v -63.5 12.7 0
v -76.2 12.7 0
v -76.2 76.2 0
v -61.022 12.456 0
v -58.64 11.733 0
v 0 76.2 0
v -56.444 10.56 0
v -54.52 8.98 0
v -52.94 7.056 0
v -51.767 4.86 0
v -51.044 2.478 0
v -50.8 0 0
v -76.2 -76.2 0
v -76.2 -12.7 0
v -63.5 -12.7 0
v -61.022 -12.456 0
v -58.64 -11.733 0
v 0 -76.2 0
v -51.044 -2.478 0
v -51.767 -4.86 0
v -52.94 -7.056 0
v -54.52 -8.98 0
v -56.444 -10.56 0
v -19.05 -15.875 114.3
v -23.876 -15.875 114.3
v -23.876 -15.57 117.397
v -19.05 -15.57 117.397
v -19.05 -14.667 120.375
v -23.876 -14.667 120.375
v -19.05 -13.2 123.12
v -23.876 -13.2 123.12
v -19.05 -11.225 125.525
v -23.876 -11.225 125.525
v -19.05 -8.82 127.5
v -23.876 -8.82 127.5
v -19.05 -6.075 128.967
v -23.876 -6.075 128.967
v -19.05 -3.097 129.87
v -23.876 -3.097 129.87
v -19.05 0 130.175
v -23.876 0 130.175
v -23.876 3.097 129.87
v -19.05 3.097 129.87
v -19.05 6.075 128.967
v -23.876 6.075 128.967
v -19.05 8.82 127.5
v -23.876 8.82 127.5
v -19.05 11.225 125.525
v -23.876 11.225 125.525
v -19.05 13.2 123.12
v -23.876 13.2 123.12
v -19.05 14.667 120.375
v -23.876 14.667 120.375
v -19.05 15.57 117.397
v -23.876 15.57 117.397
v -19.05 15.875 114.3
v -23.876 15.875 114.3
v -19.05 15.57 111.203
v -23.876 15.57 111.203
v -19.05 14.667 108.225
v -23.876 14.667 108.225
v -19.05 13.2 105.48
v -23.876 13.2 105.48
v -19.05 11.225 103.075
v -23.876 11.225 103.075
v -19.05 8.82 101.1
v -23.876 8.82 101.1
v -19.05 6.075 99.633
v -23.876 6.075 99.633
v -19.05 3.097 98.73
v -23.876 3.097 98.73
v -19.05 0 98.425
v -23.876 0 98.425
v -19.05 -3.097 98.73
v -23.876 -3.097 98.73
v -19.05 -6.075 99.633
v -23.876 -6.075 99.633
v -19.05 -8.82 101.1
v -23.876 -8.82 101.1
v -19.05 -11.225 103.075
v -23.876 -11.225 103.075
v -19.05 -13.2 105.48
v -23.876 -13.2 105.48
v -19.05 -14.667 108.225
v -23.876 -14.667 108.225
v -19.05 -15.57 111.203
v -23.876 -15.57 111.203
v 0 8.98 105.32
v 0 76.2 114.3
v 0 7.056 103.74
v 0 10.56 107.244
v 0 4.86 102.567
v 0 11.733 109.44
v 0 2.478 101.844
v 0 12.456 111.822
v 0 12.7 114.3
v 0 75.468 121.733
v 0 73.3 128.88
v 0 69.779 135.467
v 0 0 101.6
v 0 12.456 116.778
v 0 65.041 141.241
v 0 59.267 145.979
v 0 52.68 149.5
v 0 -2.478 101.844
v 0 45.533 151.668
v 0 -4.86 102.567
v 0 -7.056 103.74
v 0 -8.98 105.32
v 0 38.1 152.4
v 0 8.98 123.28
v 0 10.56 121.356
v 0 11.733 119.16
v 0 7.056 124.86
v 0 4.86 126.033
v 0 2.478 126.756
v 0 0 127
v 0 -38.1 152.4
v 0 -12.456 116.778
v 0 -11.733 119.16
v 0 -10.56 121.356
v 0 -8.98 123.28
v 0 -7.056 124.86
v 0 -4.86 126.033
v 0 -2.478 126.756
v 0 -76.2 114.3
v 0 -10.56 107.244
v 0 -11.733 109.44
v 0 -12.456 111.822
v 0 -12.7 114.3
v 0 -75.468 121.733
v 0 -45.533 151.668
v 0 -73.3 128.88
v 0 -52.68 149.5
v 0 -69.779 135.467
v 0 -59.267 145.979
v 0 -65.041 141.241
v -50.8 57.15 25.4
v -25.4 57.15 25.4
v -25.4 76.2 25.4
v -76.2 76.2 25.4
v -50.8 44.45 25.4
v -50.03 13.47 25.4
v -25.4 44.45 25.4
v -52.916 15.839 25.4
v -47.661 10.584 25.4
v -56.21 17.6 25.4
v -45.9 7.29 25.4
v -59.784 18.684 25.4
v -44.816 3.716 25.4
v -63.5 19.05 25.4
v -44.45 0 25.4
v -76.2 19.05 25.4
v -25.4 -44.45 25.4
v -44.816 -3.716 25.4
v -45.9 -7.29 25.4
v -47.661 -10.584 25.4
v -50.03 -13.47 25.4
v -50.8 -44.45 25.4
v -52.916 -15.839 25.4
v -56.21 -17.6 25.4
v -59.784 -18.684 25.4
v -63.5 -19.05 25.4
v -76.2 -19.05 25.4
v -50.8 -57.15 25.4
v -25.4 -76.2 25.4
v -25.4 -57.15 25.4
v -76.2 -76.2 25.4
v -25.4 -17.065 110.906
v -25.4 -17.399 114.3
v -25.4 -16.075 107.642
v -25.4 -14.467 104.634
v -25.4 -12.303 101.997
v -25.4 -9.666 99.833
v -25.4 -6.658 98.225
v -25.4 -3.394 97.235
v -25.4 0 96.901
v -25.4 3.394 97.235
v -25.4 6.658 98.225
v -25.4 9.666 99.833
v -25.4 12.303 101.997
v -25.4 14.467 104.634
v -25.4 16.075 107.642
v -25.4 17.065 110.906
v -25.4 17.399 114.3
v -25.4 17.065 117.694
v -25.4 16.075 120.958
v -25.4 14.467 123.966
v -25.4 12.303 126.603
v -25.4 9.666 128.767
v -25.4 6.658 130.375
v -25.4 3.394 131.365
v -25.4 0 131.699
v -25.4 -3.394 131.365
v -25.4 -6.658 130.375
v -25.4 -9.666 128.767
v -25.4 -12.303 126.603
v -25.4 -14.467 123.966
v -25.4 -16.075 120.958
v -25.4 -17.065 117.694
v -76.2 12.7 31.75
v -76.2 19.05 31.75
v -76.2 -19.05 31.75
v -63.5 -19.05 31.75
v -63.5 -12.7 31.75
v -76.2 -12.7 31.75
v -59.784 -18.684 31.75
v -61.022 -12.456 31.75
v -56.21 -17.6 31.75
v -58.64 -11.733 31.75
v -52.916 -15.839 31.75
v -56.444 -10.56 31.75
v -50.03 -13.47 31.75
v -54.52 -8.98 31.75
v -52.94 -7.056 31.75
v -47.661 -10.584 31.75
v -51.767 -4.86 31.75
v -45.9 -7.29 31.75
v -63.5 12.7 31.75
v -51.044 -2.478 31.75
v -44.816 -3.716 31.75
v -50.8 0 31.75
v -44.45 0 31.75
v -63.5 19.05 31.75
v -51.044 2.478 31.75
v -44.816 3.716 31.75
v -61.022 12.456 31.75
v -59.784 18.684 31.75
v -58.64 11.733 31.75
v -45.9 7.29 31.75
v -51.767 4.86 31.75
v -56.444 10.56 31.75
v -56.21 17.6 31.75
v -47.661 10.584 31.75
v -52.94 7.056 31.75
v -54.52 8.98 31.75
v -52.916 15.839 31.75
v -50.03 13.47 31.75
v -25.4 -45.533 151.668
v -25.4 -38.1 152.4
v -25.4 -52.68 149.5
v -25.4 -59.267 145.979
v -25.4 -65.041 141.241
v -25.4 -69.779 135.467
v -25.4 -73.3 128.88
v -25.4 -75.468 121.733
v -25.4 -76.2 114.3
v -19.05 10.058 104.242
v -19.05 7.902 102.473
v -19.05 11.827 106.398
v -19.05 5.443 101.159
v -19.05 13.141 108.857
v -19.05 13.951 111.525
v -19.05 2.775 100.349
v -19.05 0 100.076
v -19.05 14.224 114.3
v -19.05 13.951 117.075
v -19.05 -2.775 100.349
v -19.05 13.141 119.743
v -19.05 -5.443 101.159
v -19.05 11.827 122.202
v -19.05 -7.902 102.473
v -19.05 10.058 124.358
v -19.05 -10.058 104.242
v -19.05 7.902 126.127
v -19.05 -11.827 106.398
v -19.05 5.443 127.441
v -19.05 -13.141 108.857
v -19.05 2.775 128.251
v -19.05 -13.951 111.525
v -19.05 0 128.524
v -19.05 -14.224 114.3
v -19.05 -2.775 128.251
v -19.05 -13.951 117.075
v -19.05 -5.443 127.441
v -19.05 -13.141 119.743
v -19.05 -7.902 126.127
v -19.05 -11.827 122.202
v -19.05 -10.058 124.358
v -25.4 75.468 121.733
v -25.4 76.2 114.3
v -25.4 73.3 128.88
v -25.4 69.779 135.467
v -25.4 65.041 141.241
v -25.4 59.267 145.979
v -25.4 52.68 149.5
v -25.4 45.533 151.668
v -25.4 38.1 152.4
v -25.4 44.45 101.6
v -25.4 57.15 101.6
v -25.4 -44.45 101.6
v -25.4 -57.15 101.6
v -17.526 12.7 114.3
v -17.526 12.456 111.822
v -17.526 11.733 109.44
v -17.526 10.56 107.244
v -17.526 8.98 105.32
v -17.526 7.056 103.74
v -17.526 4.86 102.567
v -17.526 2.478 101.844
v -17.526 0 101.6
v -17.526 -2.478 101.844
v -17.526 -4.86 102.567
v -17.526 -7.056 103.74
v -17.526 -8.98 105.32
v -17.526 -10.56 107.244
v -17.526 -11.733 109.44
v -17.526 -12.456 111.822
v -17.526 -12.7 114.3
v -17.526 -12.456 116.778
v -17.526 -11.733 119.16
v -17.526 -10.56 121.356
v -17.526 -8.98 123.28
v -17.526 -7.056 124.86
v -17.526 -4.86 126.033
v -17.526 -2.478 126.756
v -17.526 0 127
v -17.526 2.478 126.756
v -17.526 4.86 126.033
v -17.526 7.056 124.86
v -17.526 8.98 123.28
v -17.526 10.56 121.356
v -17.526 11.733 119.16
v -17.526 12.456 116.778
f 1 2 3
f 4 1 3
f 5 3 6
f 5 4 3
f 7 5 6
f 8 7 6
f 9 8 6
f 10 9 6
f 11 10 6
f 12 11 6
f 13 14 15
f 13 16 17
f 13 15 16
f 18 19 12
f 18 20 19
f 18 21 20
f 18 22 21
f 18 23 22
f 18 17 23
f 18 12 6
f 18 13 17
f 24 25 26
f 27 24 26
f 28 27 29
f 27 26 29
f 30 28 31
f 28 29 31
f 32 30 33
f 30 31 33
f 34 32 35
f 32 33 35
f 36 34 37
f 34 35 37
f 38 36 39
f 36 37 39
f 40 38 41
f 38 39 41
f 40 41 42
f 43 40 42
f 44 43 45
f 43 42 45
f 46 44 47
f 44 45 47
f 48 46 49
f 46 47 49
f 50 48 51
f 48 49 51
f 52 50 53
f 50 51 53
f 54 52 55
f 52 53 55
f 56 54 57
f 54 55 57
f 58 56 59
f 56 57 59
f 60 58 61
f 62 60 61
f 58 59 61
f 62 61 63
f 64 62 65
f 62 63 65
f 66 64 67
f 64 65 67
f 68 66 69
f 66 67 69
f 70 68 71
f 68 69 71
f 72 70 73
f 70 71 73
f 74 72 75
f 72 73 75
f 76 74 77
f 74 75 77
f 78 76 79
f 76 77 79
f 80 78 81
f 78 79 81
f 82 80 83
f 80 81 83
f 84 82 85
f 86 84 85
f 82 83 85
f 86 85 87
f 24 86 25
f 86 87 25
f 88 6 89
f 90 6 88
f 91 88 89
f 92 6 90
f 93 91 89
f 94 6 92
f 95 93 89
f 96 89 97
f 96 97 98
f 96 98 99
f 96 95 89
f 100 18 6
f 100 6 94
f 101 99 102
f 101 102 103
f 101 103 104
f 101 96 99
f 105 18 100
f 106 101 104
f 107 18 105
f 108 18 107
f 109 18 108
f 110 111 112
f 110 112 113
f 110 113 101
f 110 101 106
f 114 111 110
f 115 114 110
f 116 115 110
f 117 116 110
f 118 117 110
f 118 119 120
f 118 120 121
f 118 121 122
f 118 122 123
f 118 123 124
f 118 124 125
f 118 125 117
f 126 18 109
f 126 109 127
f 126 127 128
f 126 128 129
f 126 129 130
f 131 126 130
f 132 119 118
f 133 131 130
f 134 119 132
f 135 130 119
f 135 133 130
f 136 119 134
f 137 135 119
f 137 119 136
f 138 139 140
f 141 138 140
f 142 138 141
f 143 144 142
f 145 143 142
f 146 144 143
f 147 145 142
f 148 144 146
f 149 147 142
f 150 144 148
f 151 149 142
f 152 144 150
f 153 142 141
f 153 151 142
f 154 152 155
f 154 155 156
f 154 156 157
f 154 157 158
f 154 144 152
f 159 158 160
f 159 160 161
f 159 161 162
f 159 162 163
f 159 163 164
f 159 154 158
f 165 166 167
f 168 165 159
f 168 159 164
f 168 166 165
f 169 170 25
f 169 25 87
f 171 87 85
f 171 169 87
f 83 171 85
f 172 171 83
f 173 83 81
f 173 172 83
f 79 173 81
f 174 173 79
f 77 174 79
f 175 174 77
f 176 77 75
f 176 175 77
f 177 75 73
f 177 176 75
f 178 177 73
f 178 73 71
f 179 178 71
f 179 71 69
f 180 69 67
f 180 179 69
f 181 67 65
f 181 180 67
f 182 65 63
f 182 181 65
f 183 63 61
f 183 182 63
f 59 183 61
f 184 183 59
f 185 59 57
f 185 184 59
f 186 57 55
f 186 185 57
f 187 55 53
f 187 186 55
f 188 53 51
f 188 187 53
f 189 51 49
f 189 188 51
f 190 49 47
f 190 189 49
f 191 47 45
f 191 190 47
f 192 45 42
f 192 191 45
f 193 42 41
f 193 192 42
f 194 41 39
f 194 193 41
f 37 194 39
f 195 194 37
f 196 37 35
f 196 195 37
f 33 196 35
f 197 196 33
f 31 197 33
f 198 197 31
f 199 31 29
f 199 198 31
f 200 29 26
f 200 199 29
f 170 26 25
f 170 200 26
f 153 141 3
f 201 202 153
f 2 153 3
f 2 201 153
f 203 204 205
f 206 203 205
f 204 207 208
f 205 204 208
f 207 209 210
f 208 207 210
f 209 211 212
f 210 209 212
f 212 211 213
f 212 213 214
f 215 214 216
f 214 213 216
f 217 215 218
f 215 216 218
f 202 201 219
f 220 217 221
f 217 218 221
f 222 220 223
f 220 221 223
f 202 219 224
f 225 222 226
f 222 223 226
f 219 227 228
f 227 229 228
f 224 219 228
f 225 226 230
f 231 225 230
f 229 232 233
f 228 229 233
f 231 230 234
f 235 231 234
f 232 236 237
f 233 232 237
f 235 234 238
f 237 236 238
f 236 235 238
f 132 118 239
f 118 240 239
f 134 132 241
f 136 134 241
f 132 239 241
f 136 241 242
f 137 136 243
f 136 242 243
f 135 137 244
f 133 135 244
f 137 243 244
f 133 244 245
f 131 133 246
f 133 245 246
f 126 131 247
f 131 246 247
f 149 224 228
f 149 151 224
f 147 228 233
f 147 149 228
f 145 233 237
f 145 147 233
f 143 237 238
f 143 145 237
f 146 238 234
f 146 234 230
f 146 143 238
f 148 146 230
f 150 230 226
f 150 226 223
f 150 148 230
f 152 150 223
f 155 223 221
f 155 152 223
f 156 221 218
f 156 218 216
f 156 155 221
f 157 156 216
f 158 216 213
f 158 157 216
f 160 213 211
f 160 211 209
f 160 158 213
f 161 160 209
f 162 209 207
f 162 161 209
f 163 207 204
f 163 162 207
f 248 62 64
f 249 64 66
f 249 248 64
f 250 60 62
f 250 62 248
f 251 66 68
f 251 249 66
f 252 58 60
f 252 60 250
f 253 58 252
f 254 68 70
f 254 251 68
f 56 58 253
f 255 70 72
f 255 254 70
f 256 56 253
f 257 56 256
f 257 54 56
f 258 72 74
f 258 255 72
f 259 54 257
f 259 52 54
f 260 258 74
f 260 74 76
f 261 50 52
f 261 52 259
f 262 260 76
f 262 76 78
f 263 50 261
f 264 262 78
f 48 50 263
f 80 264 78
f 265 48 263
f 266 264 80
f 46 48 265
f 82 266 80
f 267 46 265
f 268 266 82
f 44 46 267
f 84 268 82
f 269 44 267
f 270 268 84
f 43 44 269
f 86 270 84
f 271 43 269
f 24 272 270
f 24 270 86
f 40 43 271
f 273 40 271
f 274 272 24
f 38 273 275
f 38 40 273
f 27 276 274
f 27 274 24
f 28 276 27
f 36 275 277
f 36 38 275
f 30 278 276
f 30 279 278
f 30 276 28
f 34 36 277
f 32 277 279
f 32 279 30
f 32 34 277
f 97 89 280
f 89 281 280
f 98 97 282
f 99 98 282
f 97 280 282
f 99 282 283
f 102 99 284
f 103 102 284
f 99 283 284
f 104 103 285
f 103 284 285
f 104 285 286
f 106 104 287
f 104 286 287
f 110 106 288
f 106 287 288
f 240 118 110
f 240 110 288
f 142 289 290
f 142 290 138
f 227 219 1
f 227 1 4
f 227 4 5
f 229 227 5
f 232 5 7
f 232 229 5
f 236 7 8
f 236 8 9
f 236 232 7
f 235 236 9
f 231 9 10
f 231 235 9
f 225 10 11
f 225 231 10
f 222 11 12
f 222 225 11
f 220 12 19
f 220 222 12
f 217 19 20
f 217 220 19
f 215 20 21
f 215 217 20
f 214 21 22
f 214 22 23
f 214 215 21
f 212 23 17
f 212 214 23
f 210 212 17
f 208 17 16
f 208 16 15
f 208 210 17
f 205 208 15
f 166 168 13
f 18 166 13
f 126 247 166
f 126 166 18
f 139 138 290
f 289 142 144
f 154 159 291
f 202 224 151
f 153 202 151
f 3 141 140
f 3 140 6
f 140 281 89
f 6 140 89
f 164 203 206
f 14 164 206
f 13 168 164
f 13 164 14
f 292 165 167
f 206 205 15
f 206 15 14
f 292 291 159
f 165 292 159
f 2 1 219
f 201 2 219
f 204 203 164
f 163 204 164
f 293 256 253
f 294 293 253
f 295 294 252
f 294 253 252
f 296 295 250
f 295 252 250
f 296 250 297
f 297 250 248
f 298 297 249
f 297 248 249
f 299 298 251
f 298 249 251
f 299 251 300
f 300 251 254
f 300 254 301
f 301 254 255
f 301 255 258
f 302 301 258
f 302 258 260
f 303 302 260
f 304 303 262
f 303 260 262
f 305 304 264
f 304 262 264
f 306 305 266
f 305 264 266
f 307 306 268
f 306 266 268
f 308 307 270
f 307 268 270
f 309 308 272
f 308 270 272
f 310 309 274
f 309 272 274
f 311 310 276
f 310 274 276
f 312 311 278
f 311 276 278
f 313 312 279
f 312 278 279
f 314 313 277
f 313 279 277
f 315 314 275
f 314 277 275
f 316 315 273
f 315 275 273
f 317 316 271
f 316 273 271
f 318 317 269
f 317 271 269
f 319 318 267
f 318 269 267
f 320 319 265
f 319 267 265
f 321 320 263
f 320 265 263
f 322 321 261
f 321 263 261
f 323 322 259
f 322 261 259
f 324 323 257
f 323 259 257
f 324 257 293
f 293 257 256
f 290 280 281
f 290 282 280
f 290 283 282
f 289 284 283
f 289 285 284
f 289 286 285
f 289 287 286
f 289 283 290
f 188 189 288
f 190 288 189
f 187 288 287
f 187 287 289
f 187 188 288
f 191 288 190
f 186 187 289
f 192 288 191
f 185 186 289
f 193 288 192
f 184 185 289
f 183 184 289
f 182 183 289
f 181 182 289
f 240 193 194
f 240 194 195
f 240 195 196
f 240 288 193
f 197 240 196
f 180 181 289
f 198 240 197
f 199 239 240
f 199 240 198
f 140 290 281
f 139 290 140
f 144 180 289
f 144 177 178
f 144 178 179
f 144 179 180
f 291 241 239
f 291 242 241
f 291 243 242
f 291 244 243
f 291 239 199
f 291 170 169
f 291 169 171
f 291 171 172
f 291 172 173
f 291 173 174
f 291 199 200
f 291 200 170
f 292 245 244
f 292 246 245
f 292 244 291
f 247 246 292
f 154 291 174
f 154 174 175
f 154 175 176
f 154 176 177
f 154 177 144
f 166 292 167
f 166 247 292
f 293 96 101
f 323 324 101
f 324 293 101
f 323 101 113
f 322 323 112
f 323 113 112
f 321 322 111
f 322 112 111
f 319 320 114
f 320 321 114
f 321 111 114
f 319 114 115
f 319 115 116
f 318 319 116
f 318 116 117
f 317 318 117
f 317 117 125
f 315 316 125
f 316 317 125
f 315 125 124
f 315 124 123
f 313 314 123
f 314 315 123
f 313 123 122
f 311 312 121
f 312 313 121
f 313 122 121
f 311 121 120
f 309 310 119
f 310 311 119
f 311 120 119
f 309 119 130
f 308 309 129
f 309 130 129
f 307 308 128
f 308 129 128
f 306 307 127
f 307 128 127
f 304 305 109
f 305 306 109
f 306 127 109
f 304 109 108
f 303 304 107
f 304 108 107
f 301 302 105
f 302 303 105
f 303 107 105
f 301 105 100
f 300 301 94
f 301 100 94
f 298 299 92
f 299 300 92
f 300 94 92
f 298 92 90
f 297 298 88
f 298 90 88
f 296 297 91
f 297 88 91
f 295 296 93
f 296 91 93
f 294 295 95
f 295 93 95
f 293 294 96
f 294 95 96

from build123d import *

# Parameters (mm, degrees)
F1_DEPTH  = 76.2
F2_R      = 12.7
F3_DEPTH  = 76.201
F5_DEPTH  = 152.401
F6_R      = 15.875
F7_DEPTH  = 6.35
F8_R      = 38.1
F12_DEPTH = 12.7
F14_SIZE  = 1.524
F15_W     = 6.35
F15_H     = 6.35


with BuildPart() as f1:
    # F0 (on Front) → F1 (new body, symmetric)
    with BuildSketch(Plane.XZ):
        Polygon((0, 0), (0, 152.4), (-25.4, 152.4), (-25.4, 25.4), (-76.2, 25.4), (-76.2, 0), align=None)
    extrude(amount=F1_DEPTH, both=True)

    # F2 (on face) → F3 (cut, through all)
    with BuildSketch(Plane.YZ):
        with Locations((0, 114.3)):
            Circle(F2_R)
    extrude(amount=-F3_DEPTH, mode=Mode.SUBTRACT)

    # F4 (on face) → F5 (cut, through all)
    with BuildSketch(Plane(origin=(0, 0, 0), x_dir=(1, 0, 0), z_dir=(0, 0, -1))):
        with BuildLine():
            Line((-63.5, 12.7), (-76.2, 12.7))
            Line((-76.2, 12.7), (-76.2, -12.7))
            Line((-76.2, -12.7), (-63.5, -12.7))
            ThreePointArc((-63.5, -12.7), (-50.8, 0), (-63.5, 12.7))
        make_face()
    extrude(amount=-F5_DEPTH, mode=Mode.SUBTRACT)

    # F6 (on face) → F7 (cut)
    with BuildSketch(Plane(origin=(-25.4, 0, 0), x_dir=(0, -1, 0), z_dir=(-1, 0, 0))):
        with Locations((0, 114.3)):
            Circle(F6_R)
    extrude(amount=-F7_DEPTH, mode=Mode.SUBTRACT)

    # F8
    f8_edges = [f1.edges().sort_by_distance(p)[0] for p in [
        (-12.7, -76.2, 152.4),
        (-12.7, 76.2, 152.4),
    ]]
    fillet(f8_edges, radius=F8_R)

    # F11 (on offset) → F12 (join)
    with BuildSketch(Plane.XZ.offset(44.45)):
        Polygon((-25.4, 25.4), (-25.4, 101.6), (-50.8, 25.4), align=None)
    extrude(amount=F12_DEPTH)

    # F13: F1 across plane


with BuildPart() as f1_1:
    add(f1.part)
    add(f1.part.mirror(Plane.XZ))

    # F14
    f14_edges = [f1_1.edges().sort_by_distance(p)[0] for p in [
        (-25.4, 15.875, 114.3),
        (-19.05, -12.7, 114.3),
    ]]
    chamfer(f14_edges, length=F14_SIZE)

    # F16: sweep along a path in F16_path
    with BuildLine(Plane(origin=(-63.5, 12.7, 25.4), x_dir=(0, 1, 0), z_dir=(0, 0, 1))) as f16_path:
        Line((0, 12.7), (0, 0))
        ThreePointArc((0, 0), (-12.7, -12.7), (-25.4, 0))
        Line((-25.4, 0), (-25.4, 12.7))
    # F15 (on face) → F16 (sweep)
    with BuildSketch(Plane(origin=(-76.2, 0, 0), x_dir=(0, -1, 0), z_dir=(-1, 0, 0))):
        with Locations((-15.875, 28.575)):
            Rectangle(F15_W, F15_H)
    sweep(path=f16_path.line)


solid = f1_1.part
